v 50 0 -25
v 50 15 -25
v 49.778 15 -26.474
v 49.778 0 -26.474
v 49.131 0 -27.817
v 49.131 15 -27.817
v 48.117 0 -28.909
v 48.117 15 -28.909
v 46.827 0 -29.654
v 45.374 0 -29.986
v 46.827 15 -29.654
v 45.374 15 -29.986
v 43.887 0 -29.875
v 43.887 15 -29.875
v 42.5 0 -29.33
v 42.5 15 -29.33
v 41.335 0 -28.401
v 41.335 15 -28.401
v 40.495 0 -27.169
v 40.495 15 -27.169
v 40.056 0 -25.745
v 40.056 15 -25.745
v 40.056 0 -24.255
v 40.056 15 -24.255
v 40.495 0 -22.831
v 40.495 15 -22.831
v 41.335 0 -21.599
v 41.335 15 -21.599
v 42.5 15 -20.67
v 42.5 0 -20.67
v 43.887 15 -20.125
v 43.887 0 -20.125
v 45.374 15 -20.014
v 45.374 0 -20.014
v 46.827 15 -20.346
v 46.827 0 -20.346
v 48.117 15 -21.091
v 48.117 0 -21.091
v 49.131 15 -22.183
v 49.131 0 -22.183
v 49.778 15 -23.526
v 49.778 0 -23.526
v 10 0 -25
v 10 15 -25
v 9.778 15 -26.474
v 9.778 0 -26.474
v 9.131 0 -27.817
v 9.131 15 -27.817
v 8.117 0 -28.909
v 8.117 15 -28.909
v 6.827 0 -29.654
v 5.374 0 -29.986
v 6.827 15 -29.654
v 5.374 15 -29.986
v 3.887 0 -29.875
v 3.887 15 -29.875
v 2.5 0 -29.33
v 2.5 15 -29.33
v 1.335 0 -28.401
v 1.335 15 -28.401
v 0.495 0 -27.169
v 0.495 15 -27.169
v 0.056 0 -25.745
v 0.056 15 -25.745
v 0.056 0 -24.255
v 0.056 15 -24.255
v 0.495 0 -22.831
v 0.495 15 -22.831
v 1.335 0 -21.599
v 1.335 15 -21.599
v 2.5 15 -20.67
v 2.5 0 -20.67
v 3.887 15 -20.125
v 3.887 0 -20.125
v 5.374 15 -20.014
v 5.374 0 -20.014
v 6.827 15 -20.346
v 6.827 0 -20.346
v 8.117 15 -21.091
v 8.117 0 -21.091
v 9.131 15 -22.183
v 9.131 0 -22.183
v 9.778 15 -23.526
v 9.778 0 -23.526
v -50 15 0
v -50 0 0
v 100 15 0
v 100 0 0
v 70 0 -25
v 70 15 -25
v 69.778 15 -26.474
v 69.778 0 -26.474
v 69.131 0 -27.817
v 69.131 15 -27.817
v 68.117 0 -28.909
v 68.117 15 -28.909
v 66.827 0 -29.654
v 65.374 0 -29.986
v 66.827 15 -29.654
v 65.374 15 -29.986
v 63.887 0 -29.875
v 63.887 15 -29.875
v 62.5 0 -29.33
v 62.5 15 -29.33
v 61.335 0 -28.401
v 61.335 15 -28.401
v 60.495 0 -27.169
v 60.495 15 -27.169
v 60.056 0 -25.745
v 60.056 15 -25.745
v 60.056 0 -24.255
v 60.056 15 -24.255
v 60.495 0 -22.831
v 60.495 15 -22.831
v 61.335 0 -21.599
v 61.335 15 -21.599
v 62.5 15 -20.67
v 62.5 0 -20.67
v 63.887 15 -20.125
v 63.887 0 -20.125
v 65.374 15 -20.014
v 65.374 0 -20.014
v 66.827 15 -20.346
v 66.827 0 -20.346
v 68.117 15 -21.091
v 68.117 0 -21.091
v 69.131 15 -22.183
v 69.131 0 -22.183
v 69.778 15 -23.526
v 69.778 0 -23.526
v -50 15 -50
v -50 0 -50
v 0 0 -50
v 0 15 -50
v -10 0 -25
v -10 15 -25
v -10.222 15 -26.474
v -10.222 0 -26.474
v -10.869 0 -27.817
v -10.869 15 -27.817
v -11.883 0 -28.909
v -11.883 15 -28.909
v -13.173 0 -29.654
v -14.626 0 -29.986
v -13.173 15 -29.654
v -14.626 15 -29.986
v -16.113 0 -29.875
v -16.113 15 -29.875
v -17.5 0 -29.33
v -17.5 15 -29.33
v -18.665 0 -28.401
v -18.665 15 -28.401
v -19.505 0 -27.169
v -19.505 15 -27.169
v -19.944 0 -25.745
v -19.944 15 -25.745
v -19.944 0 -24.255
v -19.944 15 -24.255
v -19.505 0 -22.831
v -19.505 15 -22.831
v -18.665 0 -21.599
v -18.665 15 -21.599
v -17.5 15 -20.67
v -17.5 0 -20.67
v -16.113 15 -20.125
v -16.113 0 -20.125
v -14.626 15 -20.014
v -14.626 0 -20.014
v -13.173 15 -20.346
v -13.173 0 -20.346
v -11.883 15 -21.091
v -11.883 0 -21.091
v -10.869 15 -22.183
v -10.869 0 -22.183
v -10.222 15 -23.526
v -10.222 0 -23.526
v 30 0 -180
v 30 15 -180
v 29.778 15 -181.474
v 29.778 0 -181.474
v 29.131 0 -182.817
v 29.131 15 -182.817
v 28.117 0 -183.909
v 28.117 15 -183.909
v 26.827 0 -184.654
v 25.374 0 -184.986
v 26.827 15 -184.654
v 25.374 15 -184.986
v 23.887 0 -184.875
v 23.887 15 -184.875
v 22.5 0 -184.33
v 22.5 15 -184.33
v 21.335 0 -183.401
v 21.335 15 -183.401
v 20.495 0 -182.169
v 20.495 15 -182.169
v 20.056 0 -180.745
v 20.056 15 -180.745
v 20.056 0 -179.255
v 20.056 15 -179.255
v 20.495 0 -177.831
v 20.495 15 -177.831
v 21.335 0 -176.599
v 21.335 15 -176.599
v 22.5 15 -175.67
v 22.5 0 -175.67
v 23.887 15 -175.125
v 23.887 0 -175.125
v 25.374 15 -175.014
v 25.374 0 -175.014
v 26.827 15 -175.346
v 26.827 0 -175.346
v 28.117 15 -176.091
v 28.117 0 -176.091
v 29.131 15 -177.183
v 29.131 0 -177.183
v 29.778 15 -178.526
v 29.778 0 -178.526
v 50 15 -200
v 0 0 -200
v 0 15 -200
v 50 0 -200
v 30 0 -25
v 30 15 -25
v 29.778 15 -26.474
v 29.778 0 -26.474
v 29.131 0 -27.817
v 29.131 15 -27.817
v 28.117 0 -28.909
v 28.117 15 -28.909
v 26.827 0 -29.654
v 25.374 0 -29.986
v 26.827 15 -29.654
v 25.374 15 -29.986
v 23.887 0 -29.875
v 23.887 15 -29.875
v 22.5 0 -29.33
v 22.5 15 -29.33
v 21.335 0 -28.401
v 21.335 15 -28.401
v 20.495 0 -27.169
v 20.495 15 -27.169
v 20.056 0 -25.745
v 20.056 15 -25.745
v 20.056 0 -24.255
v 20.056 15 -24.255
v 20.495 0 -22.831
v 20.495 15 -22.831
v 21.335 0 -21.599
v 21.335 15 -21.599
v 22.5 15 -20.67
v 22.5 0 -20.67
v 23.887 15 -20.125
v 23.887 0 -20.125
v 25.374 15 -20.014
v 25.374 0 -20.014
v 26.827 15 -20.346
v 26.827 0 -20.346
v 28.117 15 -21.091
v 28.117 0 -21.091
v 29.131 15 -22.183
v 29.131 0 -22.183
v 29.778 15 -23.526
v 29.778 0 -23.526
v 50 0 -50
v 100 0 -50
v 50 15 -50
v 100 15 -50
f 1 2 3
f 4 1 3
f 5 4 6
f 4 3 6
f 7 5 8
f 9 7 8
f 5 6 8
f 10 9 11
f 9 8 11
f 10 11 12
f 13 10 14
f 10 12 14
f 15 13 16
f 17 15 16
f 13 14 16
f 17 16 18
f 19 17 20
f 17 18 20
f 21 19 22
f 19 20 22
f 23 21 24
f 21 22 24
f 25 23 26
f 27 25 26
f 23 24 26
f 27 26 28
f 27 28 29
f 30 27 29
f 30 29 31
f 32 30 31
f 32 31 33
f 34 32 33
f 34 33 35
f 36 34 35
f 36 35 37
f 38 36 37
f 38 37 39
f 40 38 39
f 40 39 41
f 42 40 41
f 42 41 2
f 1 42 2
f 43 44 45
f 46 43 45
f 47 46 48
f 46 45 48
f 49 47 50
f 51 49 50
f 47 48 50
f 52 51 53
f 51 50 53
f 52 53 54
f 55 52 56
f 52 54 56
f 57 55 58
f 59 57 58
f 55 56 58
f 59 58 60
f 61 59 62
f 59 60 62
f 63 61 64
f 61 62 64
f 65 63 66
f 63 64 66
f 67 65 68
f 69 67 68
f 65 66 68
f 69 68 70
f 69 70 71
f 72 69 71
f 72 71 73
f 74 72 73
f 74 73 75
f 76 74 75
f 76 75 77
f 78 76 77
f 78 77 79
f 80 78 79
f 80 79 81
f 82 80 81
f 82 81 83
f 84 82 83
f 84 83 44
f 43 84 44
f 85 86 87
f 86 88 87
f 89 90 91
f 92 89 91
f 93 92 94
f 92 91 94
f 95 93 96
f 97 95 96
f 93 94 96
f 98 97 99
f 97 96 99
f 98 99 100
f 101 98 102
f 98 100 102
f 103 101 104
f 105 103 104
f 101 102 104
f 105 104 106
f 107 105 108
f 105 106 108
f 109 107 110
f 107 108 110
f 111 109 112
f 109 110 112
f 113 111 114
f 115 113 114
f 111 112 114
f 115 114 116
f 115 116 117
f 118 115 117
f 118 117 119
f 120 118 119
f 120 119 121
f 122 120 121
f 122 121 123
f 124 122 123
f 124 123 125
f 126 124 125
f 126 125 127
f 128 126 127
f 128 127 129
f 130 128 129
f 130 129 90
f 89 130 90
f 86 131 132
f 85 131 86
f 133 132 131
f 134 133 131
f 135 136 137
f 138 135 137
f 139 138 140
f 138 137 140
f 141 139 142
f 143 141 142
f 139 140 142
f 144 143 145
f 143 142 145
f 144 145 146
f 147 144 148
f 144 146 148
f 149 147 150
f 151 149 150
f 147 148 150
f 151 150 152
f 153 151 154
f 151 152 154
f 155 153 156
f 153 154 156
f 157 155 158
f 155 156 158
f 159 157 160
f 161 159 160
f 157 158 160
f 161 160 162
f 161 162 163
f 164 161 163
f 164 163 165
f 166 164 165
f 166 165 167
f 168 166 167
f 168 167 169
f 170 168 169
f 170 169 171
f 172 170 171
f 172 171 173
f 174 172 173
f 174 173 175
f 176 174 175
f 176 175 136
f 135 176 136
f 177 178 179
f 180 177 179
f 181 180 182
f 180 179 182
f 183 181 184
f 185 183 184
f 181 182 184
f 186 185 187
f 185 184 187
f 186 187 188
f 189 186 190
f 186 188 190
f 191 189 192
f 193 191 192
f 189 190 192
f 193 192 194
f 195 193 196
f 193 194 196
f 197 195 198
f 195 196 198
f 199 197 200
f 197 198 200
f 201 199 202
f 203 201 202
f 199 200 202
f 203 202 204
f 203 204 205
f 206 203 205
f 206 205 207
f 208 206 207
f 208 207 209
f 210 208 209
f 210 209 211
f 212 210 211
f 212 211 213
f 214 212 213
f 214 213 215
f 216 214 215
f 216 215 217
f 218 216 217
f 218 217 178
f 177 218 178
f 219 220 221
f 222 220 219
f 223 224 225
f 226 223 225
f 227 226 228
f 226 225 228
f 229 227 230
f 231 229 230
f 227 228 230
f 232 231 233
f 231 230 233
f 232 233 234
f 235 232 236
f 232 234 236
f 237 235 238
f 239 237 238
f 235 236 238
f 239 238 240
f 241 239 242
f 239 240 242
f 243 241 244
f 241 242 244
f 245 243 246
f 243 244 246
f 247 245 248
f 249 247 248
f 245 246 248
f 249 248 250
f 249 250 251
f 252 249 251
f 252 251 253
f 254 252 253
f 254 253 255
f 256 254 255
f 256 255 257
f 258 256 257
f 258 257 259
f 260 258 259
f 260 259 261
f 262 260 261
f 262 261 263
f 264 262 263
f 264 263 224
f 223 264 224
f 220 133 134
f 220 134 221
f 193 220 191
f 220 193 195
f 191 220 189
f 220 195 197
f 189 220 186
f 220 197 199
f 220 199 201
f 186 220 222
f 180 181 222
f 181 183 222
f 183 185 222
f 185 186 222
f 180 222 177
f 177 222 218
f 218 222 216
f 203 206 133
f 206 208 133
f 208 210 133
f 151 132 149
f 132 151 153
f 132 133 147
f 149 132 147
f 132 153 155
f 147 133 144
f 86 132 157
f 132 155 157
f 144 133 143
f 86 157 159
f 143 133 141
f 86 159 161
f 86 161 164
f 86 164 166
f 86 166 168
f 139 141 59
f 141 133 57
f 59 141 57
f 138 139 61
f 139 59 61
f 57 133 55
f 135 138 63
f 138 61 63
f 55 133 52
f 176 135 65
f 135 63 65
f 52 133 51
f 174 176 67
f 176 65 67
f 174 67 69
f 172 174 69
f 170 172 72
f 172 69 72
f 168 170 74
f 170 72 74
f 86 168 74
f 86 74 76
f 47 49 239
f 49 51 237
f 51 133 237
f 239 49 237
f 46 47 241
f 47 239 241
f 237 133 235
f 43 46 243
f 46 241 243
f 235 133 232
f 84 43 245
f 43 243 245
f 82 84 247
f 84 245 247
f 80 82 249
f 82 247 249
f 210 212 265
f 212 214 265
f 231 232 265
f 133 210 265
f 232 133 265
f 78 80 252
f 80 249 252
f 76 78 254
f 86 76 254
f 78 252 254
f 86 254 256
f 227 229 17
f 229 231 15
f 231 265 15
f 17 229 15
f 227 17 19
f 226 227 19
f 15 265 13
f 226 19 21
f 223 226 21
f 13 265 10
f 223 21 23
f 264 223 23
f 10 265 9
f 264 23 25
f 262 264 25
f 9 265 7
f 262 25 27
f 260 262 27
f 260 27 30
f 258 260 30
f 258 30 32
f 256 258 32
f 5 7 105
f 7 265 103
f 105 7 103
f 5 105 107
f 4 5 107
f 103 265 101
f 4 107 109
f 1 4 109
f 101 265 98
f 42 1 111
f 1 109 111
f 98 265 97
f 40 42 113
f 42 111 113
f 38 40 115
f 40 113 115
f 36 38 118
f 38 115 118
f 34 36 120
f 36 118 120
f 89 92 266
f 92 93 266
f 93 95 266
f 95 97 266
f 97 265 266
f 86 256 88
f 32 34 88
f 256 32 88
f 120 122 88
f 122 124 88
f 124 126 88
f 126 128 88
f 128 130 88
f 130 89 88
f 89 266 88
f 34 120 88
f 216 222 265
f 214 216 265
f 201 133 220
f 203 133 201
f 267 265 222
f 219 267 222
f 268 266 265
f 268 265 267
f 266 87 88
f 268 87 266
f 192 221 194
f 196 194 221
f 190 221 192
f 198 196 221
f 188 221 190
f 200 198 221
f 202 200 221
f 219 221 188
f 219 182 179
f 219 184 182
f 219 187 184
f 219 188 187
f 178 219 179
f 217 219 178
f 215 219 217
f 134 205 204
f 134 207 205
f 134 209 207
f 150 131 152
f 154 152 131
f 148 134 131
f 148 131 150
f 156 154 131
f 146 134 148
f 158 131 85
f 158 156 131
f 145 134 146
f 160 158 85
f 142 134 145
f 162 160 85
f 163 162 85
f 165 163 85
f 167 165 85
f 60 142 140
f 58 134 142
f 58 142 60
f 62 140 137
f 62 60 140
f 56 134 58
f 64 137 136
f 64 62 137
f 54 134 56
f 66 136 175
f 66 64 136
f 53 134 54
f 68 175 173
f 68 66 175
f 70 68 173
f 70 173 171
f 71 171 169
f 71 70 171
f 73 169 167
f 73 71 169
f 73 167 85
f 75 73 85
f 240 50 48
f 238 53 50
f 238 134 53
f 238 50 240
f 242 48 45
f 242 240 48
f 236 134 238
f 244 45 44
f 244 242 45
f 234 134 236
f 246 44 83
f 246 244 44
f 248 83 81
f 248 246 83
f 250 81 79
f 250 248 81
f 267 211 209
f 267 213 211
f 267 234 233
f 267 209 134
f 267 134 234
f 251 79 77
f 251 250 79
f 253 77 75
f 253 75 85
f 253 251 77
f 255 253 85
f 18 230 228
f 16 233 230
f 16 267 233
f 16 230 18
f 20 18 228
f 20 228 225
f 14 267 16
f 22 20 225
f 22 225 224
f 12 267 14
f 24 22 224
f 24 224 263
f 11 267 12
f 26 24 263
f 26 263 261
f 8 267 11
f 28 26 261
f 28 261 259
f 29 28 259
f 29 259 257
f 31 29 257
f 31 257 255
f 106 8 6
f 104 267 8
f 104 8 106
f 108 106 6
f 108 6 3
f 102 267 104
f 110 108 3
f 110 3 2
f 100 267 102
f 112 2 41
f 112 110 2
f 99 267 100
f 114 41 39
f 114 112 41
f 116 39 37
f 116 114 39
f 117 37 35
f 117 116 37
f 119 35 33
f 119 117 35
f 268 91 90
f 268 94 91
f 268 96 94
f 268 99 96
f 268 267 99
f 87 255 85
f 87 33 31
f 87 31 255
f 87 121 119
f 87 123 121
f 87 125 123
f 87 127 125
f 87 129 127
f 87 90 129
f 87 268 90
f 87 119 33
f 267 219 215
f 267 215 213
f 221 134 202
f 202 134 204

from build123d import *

# Parameters (mm, degrees)
SKETCH1_W           = 50
SKETCH1_H           = 200
BOSS_EXTRUDE1_DEPTH = 15
SKETCH2_R           = 5
CUT_EXTRUDE2_DEPTH  = 16
SKETCH3_W           = 50
SKETCH3_H           = 15
BOSS_EXTRUDE2_DEPTH = 50
SKETCH4_W           = 50
SKETCH4_H           = 15
BOSS_EXTRUDE3_DEPTH = 50
SKETCH5_R           = 5
CUT_EXTRUDE3_DEPTH  = 16


with BuildPart() as part:
    # Sketch1 → Boss-Extrude1 (new body)
    with BuildSketch(Plane(origin=(0, 0, 0), x_dir=(1, 0, 0), z_dir=(0, 1, 0))):
        with Locations((25, 100)):
            Rectangle(SKETCH1_W, SKETCH1_H)
    extrude(amount=BOSS_EXTRUDE1_DEPTH)

    # Sketch2 → Cut-Extrude2 (cut, through all)
    with BuildSketch(Plane(origin=(0, 15, 0), x_dir=(1, 0, 0), z_dir=(0, 1, 0))):
        with Locations((25, 180)):
            Circle(SKETCH2_R)
    extrude(amount=-CUT_EXTRUDE2_DEPTH, mode=Mode.SUBTRACT)

    # Sketch3 → Boss-Extrude2 (add)
    with BuildSketch(Plane(origin=(50, 0, 0), x_dir=(0, 0, -1), z_dir=(1, 0, 0))):
        with Locations((25, 7.5)):
            Rectangle(SKETCH3_W, SKETCH3_H)
    extrude(amount=BOSS_EXTRUDE2_DEPTH)

    # Sketch4 → Boss-Extrude3 (add)
    with BuildSketch(Plane.ZY):
        with Locations((-25, 7.5)):
            Rectangle(SKETCH4_W, SKETCH4_H)
    extrude(amount=BOSS_EXTRUDE3_DEPTH)

    # Sketch5 → Cut-Extrude3 (cut, through all)
    with BuildSketch(Plane(origin=(0, 15, 0), x_dir=(1, 0, 0), z_dir=(0, 1, 0))):
        with Locations((25, 25)):
            Circle(SKETCH5_R)
        with Locations((5, 25)):
            Circle(SKETCH5_R)
        with Locations((-15, 25)):
            Circle(SKETCH5_R)
        with Locations((45, 25)):
            Circle(SKETCH5_R)
        with Locations((65, 25)):
            Circle(SKETCH5_R)
    extrude(amount=-CUT_EXTRUDE3_DEPTH, mode=Mode.SUBTRACT)


solid = part.part
